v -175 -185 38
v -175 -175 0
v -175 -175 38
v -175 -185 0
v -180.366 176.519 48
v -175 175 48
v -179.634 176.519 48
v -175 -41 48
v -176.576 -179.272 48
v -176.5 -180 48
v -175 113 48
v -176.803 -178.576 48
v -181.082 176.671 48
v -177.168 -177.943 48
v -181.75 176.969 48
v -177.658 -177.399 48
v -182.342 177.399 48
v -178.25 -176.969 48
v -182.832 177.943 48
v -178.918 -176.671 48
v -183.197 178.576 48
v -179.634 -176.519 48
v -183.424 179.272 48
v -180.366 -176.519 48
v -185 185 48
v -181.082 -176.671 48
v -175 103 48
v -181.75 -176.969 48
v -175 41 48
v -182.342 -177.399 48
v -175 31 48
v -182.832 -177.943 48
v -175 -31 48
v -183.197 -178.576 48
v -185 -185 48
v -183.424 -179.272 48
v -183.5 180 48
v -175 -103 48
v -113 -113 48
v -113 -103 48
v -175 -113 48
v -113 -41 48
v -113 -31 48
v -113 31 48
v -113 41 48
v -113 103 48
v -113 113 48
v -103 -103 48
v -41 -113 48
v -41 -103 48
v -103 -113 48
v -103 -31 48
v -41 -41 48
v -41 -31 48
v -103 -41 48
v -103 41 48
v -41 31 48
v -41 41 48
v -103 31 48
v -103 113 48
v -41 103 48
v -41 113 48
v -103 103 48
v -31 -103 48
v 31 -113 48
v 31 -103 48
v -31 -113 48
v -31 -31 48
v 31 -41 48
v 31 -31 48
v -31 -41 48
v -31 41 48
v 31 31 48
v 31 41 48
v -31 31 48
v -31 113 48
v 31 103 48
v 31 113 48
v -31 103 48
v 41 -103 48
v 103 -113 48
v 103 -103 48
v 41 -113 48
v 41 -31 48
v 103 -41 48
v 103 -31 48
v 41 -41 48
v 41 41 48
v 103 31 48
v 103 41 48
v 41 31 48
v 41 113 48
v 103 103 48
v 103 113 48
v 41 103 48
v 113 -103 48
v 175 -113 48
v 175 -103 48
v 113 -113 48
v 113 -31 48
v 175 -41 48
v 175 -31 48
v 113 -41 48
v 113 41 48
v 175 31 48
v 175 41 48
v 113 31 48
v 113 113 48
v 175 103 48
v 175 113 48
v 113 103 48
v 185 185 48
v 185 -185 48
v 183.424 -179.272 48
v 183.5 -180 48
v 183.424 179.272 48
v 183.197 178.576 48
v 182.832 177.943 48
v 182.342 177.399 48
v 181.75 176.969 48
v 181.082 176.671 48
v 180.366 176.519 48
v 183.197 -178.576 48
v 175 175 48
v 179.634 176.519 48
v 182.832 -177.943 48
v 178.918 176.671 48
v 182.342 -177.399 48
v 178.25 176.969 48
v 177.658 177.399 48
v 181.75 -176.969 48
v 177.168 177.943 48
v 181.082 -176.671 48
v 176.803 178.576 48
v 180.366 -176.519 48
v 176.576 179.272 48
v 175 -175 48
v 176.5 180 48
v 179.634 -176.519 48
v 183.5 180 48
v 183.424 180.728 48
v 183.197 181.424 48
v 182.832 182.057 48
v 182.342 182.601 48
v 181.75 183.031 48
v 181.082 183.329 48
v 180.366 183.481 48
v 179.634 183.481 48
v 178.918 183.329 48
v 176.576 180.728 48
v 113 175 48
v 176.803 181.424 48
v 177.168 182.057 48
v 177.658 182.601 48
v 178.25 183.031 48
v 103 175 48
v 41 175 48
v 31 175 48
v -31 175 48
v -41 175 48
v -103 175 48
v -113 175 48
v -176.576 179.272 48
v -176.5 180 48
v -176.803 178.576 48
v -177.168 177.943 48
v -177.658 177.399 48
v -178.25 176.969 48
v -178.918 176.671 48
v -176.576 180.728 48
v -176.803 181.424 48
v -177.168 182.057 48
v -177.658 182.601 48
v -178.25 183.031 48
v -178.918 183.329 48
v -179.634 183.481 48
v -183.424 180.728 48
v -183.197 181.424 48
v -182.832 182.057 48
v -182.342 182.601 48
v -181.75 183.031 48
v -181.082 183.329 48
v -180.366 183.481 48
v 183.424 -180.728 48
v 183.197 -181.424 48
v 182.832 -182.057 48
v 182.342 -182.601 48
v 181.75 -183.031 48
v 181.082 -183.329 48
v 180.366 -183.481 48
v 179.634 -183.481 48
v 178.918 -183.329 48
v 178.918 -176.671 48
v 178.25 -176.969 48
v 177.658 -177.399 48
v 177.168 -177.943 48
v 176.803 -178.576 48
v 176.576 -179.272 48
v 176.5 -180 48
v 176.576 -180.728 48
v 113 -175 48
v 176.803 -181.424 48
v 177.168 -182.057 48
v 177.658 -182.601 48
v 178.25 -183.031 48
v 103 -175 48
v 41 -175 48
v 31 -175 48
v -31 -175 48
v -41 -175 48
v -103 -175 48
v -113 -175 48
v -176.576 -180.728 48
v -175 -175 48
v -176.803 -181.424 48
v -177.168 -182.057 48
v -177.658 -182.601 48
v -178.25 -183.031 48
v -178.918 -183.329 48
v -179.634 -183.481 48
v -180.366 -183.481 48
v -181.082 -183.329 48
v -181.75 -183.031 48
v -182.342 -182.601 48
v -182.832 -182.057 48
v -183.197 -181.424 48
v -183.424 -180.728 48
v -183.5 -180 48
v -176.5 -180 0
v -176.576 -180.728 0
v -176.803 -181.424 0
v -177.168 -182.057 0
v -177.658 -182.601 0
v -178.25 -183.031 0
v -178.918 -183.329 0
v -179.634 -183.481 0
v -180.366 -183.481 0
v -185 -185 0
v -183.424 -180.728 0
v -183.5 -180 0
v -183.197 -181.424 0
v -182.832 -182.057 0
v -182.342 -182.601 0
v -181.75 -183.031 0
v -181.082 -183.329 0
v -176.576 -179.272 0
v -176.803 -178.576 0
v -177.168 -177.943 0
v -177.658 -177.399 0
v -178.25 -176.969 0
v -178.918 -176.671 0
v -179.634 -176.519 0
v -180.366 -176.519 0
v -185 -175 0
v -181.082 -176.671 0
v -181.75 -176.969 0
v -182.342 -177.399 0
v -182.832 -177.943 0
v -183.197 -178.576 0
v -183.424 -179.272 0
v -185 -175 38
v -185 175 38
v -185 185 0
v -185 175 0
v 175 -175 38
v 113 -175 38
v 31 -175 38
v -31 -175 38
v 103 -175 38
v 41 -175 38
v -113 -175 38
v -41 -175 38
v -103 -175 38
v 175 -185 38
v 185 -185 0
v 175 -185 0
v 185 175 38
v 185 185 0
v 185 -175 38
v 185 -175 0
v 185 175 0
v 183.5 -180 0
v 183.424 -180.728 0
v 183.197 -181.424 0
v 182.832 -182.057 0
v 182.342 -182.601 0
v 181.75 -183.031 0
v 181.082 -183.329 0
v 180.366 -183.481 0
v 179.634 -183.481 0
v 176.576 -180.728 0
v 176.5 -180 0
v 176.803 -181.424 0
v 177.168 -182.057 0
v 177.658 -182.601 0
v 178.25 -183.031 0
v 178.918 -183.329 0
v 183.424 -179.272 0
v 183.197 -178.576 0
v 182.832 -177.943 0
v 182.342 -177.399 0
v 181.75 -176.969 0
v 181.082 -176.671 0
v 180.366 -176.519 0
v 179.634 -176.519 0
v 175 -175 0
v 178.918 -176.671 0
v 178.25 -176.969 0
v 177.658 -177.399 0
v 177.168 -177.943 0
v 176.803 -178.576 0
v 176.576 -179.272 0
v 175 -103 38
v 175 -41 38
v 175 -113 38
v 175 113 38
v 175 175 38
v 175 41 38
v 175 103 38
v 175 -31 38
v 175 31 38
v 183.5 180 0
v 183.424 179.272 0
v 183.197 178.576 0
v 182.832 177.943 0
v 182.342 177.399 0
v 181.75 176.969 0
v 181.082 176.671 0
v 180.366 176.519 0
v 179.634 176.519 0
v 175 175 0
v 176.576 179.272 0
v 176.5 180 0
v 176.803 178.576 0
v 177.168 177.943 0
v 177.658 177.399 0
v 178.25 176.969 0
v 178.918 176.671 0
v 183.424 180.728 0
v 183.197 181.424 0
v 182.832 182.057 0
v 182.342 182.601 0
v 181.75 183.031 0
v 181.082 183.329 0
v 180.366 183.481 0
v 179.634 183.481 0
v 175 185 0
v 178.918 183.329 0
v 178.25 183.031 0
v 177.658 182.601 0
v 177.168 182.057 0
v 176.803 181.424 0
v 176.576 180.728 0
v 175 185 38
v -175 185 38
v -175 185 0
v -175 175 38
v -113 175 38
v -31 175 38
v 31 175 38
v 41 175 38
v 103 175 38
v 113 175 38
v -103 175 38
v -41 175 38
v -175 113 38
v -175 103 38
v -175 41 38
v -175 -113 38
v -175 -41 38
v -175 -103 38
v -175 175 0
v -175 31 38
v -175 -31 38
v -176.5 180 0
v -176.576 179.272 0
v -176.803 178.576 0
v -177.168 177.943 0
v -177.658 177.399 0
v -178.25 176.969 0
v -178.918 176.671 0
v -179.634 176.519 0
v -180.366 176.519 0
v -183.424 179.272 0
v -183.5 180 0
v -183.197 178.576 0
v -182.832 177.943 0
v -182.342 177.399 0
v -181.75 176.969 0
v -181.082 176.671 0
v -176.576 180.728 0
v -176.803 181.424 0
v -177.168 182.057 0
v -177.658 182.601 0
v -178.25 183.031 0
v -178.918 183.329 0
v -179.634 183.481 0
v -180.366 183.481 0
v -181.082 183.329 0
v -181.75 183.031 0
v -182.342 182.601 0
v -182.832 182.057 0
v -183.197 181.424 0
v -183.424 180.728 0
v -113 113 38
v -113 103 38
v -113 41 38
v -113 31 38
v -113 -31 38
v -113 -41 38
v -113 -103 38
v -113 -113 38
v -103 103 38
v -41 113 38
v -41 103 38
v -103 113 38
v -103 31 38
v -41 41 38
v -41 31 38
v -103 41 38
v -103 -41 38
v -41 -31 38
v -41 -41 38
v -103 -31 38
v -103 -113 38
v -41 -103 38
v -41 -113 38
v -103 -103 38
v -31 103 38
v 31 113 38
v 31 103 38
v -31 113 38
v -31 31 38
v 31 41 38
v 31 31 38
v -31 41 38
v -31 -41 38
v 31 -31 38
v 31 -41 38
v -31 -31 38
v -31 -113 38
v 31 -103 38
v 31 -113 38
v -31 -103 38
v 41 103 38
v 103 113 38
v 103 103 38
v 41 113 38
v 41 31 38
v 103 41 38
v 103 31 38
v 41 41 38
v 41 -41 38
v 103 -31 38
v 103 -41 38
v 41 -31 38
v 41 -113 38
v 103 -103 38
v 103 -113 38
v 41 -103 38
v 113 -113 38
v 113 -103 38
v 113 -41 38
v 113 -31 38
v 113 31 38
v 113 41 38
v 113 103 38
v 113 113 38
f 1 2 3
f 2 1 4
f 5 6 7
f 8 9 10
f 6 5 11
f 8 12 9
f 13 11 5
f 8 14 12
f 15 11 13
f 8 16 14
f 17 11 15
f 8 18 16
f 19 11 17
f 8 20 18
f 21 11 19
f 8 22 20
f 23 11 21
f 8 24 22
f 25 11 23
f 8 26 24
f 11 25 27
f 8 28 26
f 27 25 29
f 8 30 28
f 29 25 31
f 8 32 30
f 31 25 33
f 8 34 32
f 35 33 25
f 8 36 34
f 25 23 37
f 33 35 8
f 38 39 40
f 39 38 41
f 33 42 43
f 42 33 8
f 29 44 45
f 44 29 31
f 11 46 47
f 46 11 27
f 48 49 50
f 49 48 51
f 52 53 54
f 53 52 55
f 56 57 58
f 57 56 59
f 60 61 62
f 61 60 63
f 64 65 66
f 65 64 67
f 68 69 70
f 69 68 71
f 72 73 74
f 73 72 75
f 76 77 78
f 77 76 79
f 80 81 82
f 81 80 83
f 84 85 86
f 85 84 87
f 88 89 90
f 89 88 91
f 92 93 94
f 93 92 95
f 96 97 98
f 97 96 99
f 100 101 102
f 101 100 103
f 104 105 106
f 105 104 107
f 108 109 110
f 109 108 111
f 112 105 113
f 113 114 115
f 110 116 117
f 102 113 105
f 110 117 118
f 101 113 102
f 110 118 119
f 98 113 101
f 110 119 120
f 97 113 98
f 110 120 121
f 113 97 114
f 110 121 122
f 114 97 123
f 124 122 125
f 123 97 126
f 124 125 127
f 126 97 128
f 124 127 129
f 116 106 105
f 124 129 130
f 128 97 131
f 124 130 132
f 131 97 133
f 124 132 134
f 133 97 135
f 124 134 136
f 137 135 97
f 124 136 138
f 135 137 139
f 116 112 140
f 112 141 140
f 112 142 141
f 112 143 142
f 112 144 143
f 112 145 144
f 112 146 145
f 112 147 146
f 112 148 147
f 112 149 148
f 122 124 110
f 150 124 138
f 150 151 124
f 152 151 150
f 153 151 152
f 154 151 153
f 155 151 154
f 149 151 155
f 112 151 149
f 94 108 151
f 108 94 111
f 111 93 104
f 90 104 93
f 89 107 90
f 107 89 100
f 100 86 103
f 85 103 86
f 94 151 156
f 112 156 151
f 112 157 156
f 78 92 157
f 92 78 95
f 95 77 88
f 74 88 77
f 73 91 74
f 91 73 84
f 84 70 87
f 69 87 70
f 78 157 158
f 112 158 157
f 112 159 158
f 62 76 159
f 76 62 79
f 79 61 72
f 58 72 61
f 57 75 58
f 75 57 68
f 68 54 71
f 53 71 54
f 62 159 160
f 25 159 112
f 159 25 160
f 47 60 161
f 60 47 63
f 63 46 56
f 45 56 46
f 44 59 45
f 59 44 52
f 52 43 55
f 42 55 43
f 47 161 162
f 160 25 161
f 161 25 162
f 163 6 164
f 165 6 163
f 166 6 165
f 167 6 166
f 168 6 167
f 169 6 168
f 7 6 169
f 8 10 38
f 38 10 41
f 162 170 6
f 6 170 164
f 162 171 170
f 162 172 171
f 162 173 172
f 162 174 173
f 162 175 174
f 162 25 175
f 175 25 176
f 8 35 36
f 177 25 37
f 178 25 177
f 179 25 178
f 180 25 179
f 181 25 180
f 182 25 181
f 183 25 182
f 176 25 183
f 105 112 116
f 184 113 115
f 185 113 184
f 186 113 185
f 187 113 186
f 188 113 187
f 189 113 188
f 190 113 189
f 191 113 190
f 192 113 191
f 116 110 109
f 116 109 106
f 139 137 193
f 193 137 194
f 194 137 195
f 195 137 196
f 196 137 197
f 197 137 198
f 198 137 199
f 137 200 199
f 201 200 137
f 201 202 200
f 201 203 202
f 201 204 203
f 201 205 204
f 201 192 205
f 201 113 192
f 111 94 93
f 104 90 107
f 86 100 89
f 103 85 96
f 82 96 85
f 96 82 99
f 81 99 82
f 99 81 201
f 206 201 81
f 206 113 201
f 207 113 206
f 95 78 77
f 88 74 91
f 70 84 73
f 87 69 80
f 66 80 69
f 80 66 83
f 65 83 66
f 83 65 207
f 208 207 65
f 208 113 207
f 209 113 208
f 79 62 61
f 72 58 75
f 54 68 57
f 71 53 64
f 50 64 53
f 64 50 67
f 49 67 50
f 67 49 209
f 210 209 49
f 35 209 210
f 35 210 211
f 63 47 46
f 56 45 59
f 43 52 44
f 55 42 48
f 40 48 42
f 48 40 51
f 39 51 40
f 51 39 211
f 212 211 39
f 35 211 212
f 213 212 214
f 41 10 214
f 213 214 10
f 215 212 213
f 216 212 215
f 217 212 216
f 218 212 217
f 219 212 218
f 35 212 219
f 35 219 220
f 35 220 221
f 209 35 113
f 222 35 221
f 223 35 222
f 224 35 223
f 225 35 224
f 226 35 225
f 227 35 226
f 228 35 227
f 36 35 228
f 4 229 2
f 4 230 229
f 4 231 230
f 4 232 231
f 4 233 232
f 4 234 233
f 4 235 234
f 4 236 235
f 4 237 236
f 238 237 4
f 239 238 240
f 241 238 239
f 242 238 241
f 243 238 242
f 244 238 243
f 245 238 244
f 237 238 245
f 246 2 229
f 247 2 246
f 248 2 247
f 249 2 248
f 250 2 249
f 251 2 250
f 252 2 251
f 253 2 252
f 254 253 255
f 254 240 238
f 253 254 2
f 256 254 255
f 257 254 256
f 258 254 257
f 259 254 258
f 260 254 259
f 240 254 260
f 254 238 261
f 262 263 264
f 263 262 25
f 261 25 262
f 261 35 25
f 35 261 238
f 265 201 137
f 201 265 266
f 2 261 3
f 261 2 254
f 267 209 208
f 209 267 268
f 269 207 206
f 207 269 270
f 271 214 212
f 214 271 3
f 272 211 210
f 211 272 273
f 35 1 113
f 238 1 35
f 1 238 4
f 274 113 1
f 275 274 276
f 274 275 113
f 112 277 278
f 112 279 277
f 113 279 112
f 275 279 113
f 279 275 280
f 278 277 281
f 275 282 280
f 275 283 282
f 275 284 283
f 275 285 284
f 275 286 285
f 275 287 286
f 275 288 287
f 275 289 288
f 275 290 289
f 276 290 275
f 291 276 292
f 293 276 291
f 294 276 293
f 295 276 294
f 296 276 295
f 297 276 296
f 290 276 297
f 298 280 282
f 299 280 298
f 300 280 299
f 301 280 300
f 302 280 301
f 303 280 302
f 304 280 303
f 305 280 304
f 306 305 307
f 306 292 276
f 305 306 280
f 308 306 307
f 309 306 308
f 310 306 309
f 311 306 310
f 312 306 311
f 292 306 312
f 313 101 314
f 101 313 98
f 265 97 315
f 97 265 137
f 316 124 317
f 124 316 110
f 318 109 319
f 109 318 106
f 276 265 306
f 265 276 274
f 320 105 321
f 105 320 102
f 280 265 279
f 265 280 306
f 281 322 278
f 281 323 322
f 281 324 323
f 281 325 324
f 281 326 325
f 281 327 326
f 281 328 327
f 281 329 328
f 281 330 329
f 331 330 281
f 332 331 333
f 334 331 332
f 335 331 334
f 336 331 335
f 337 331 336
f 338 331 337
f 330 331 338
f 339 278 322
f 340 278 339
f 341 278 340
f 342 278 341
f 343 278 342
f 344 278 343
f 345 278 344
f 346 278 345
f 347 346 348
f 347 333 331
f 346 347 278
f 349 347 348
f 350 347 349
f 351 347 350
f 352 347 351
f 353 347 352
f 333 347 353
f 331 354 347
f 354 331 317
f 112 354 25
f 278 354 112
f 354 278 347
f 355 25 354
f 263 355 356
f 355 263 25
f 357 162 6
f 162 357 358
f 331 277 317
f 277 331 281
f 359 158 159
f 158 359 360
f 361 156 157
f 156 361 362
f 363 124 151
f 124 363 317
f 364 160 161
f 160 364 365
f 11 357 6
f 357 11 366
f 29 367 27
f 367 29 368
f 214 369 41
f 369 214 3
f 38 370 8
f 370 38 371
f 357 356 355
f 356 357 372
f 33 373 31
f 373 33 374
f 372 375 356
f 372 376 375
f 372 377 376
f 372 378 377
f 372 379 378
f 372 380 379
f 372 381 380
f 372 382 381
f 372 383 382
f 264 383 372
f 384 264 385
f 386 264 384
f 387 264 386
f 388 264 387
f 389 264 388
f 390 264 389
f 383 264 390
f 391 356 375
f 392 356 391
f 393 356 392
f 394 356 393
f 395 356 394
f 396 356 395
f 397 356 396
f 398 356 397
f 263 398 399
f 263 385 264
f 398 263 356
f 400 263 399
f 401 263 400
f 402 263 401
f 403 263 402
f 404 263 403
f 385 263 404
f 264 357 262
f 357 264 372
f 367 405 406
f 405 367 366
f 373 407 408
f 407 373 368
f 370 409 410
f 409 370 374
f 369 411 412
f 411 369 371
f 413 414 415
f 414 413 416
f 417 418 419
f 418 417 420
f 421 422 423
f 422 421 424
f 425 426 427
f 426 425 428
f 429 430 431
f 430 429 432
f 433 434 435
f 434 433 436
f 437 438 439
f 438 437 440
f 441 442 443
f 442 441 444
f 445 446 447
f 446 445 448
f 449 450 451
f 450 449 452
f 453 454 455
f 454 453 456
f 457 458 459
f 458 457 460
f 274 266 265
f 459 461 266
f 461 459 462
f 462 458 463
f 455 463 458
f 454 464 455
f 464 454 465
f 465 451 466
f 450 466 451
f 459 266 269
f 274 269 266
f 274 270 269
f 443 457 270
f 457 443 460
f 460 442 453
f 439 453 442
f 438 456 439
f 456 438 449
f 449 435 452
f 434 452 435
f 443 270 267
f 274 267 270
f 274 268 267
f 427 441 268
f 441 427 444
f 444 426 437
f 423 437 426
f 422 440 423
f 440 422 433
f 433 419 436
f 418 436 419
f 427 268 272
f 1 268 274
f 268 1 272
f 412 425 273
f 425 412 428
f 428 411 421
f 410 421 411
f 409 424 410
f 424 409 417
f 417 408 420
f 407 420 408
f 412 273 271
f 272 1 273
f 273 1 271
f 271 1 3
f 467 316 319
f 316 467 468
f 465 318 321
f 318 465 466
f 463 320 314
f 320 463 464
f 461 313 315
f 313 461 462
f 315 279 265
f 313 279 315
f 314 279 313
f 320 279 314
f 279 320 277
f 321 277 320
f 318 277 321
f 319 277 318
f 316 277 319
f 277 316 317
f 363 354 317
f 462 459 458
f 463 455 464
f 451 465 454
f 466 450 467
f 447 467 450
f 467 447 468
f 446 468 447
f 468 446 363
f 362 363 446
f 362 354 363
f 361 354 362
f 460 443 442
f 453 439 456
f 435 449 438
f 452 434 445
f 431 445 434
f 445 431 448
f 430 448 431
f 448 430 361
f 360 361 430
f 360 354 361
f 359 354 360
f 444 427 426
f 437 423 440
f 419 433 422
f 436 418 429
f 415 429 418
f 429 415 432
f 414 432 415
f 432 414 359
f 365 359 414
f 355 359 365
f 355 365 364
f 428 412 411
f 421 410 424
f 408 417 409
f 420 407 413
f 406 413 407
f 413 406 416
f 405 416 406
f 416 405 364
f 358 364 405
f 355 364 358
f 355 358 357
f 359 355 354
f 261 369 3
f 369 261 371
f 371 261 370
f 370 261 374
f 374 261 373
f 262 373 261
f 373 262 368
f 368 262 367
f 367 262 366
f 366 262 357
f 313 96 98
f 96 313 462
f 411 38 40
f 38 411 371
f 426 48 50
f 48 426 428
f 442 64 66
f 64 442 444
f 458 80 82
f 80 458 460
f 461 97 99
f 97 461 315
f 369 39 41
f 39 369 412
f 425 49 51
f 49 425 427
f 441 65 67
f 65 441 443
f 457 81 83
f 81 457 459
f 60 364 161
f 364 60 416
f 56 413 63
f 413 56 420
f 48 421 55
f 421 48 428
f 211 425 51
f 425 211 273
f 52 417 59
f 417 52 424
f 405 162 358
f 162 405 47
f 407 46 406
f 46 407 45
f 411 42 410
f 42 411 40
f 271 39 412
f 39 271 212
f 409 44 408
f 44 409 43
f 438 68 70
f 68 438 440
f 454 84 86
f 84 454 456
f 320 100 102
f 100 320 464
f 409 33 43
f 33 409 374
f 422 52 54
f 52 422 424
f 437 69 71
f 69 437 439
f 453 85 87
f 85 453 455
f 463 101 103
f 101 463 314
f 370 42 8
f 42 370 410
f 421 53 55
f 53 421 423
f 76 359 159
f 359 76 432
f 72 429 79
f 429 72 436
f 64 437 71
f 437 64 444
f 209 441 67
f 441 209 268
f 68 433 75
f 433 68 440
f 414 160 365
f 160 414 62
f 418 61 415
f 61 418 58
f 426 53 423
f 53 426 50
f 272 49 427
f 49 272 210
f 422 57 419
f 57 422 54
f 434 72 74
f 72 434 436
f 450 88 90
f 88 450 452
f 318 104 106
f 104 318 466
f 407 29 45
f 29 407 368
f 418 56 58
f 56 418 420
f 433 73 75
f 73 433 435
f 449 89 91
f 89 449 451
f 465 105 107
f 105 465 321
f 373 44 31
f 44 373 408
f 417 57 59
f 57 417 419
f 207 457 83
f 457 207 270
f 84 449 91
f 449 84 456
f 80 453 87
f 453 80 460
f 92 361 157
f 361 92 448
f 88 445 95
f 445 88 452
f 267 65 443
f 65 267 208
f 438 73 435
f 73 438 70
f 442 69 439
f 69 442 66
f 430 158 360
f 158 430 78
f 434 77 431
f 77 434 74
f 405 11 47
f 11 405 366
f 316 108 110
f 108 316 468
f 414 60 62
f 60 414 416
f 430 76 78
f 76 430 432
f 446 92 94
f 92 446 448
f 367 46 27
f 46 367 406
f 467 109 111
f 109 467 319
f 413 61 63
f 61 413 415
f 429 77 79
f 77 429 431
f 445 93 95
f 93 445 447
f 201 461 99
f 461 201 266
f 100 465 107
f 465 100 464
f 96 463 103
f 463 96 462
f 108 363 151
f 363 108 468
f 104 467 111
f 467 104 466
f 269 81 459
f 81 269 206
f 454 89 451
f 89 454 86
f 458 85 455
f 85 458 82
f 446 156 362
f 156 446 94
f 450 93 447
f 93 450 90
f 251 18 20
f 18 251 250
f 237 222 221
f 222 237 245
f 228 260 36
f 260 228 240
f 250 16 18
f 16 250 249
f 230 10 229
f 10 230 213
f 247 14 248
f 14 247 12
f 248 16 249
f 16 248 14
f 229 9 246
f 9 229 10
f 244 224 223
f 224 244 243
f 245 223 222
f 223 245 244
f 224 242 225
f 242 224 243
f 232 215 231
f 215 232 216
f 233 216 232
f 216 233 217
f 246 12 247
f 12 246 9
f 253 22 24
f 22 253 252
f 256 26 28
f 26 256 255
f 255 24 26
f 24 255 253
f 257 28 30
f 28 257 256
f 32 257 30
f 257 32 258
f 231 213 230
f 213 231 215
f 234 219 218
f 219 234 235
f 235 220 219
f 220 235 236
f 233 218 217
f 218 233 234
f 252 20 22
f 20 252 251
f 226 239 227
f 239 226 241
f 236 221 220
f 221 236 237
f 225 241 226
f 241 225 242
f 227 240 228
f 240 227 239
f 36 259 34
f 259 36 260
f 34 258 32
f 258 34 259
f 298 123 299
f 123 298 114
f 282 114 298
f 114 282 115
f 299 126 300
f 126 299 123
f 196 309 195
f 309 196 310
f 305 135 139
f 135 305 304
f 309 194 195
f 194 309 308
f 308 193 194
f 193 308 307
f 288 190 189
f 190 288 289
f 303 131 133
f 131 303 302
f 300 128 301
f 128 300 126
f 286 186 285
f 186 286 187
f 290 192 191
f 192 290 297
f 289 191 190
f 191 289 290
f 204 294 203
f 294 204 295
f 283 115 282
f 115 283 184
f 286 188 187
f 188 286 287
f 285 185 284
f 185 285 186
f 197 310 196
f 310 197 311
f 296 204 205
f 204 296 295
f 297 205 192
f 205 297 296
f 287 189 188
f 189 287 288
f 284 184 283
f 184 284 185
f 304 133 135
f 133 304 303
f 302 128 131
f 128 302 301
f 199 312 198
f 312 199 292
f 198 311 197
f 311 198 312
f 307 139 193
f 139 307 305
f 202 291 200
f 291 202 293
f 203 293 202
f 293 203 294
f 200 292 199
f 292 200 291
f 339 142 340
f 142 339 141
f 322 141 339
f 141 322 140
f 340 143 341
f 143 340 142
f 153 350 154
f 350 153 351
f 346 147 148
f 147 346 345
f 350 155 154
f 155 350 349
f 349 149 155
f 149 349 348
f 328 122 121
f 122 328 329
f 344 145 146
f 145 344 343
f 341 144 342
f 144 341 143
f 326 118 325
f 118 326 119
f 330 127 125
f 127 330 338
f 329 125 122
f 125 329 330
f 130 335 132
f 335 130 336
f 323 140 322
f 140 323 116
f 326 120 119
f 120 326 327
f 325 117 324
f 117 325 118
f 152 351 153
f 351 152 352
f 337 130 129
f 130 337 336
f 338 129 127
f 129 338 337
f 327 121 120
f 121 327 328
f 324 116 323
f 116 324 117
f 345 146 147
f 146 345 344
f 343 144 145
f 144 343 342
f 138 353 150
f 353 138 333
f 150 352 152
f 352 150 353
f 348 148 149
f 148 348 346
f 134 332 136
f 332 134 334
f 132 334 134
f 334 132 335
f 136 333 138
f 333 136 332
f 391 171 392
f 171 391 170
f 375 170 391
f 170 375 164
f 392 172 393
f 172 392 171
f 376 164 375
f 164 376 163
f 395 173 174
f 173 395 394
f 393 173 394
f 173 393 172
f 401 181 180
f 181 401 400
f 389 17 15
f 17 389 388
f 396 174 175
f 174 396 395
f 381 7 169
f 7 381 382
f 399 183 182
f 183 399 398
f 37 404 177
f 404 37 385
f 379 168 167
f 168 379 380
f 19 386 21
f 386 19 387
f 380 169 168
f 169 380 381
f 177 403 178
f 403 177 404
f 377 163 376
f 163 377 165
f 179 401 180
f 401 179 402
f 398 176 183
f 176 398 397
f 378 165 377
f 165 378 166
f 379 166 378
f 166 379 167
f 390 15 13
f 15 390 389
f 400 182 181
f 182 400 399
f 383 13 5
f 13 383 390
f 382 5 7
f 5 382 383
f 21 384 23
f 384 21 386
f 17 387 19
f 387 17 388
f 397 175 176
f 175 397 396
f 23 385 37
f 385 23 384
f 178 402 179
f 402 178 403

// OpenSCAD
difference()
{
  union()
  {
    // Vertical corner bars
    translate([-185, -185, 0]) cube([10, 10, 48]);
    translate([175, -185, 0]) cube([10, 10, 48]);
    translate([175, 175, 0]) cube([10, 10, 48]);
    translate([-185, 175, 0]) cube([10, 10, 48]); // Perimeter bars
    translate([-185, -185, 38]) cube([370, 10, 10]);
    translate([-185, 175, 38]) cube([370, 10, 10]);
    translate([-185, -185, 38]) cube([10, 370, 10]);
    translate([175, -185, 38]) cube([10, 370, 10]); // Intermediate grid bars
    translate([-185, -113, 38]) cube([370, 10, 10]);
    translate([-113, -185, 38]) cube([10, 370, 10]);
    translate([-185, -41, 38]) cube([370, 10, 10]);
    translate([-41, -185, 38]) cube([10, 370, 10]);
    translate([-185, 31, 38]) cube([370, 10, 10]);
    translate([31, -185, 38]) cube([10, 370, 10]);
    translate([-185, 103, 38]) cube([370, 10, 10]);
    translate([103, -185, 38]) cube([10, 370, 10]);
  }
  // Holes for M6 rods
  translate([-180, -180, -1]) cylinder(d = 7, h = 50, $fn = 30);
  translate([180, -180, -1]) cylinder(d = 7, h = 50, $fn = 30);
  translate([180, 180, -1]) cylinder(d = 7, h = 50, $fn = 30);
  translate([-180, 180, -1]) cylinder(d = 7, h = 50, $fn = 30);
}
